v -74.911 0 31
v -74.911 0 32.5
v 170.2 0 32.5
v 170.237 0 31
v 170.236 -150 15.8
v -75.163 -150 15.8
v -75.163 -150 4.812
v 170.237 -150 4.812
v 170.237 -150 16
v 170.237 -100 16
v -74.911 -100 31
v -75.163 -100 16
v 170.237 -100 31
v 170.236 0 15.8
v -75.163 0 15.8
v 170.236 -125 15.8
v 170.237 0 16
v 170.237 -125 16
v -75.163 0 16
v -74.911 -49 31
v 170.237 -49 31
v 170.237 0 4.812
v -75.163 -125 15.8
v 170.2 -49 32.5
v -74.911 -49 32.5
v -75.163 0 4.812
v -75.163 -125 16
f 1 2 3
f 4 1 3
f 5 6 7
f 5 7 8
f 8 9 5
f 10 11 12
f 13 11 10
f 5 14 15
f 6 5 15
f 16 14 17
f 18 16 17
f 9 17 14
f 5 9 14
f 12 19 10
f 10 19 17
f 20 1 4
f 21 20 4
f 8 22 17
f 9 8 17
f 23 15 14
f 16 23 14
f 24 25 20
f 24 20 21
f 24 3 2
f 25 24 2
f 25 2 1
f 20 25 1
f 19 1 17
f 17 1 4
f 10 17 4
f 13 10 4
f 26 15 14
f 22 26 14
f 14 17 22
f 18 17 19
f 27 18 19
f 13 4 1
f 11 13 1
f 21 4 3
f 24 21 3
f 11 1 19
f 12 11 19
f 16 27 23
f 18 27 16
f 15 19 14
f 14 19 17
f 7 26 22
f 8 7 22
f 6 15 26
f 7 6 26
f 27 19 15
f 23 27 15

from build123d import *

# Parameters (mm, degrees)
F1_DEPTH = 125
F2_DEPTH = 100
F3_DEPTH = 49
F4_DEPTH = 150


with BuildPart() as f1:
    # F0 (on Front) → F1 (new body)
    with BuildSketch(Plane.XZ):
        Polygon((-21.76261, 16), (-43.054478, 16), (-75.163431, 16), (-75.163431, 15.800006), (170.235842, 15.800006), (170.23739, 16), (148.945522, 16), (106.23739, 16), (84.945522, 16), (42.23739, 16), (20.945522, 16), align=None)
    extrude(amount=F1_DEPTH)


with BuildPart() as f2:
    # F0 (on Front) → F2 (new body)
    with BuildSketch(Plane.XZ):
        Polygon((-75.163431, 16), (-43.054478, 16), (-21.76261, 16), (20.945522, 16), (42.23739, 16), (84.945522, 16), (106.23739, 16), (148.945522, 16), (170.23739, 16), (170.23739, 31), (-74.911438, 31), align=None)
    extrude(amount=F2_DEPTH)


with BuildPart() as f3:
    # F0 (on Front) → F3 (new body)
    with BuildSketch(Plane.XZ):
        Polygon((-74.911438, 32.499531), (-74.911438, 31), (170.23739, 31), (170.199873, 32.499531), align=None)
    extrude(amount=F3_DEPTH)


with BuildPart() as f4:
    # F0 (on Front) → F4 (new body)
    with BuildSketch(Plane.XZ):
        Polygon((170.235842, 15.800006), (-75.163431, 15.800006), (-75.163431, 4.811984), (170.23739, 4.811984), (170.23739, 16), align=None)
    extrude(amount=F4_DEPTH)


solid = Compound([f1.part, f2.part, f3.part, f4.part])
